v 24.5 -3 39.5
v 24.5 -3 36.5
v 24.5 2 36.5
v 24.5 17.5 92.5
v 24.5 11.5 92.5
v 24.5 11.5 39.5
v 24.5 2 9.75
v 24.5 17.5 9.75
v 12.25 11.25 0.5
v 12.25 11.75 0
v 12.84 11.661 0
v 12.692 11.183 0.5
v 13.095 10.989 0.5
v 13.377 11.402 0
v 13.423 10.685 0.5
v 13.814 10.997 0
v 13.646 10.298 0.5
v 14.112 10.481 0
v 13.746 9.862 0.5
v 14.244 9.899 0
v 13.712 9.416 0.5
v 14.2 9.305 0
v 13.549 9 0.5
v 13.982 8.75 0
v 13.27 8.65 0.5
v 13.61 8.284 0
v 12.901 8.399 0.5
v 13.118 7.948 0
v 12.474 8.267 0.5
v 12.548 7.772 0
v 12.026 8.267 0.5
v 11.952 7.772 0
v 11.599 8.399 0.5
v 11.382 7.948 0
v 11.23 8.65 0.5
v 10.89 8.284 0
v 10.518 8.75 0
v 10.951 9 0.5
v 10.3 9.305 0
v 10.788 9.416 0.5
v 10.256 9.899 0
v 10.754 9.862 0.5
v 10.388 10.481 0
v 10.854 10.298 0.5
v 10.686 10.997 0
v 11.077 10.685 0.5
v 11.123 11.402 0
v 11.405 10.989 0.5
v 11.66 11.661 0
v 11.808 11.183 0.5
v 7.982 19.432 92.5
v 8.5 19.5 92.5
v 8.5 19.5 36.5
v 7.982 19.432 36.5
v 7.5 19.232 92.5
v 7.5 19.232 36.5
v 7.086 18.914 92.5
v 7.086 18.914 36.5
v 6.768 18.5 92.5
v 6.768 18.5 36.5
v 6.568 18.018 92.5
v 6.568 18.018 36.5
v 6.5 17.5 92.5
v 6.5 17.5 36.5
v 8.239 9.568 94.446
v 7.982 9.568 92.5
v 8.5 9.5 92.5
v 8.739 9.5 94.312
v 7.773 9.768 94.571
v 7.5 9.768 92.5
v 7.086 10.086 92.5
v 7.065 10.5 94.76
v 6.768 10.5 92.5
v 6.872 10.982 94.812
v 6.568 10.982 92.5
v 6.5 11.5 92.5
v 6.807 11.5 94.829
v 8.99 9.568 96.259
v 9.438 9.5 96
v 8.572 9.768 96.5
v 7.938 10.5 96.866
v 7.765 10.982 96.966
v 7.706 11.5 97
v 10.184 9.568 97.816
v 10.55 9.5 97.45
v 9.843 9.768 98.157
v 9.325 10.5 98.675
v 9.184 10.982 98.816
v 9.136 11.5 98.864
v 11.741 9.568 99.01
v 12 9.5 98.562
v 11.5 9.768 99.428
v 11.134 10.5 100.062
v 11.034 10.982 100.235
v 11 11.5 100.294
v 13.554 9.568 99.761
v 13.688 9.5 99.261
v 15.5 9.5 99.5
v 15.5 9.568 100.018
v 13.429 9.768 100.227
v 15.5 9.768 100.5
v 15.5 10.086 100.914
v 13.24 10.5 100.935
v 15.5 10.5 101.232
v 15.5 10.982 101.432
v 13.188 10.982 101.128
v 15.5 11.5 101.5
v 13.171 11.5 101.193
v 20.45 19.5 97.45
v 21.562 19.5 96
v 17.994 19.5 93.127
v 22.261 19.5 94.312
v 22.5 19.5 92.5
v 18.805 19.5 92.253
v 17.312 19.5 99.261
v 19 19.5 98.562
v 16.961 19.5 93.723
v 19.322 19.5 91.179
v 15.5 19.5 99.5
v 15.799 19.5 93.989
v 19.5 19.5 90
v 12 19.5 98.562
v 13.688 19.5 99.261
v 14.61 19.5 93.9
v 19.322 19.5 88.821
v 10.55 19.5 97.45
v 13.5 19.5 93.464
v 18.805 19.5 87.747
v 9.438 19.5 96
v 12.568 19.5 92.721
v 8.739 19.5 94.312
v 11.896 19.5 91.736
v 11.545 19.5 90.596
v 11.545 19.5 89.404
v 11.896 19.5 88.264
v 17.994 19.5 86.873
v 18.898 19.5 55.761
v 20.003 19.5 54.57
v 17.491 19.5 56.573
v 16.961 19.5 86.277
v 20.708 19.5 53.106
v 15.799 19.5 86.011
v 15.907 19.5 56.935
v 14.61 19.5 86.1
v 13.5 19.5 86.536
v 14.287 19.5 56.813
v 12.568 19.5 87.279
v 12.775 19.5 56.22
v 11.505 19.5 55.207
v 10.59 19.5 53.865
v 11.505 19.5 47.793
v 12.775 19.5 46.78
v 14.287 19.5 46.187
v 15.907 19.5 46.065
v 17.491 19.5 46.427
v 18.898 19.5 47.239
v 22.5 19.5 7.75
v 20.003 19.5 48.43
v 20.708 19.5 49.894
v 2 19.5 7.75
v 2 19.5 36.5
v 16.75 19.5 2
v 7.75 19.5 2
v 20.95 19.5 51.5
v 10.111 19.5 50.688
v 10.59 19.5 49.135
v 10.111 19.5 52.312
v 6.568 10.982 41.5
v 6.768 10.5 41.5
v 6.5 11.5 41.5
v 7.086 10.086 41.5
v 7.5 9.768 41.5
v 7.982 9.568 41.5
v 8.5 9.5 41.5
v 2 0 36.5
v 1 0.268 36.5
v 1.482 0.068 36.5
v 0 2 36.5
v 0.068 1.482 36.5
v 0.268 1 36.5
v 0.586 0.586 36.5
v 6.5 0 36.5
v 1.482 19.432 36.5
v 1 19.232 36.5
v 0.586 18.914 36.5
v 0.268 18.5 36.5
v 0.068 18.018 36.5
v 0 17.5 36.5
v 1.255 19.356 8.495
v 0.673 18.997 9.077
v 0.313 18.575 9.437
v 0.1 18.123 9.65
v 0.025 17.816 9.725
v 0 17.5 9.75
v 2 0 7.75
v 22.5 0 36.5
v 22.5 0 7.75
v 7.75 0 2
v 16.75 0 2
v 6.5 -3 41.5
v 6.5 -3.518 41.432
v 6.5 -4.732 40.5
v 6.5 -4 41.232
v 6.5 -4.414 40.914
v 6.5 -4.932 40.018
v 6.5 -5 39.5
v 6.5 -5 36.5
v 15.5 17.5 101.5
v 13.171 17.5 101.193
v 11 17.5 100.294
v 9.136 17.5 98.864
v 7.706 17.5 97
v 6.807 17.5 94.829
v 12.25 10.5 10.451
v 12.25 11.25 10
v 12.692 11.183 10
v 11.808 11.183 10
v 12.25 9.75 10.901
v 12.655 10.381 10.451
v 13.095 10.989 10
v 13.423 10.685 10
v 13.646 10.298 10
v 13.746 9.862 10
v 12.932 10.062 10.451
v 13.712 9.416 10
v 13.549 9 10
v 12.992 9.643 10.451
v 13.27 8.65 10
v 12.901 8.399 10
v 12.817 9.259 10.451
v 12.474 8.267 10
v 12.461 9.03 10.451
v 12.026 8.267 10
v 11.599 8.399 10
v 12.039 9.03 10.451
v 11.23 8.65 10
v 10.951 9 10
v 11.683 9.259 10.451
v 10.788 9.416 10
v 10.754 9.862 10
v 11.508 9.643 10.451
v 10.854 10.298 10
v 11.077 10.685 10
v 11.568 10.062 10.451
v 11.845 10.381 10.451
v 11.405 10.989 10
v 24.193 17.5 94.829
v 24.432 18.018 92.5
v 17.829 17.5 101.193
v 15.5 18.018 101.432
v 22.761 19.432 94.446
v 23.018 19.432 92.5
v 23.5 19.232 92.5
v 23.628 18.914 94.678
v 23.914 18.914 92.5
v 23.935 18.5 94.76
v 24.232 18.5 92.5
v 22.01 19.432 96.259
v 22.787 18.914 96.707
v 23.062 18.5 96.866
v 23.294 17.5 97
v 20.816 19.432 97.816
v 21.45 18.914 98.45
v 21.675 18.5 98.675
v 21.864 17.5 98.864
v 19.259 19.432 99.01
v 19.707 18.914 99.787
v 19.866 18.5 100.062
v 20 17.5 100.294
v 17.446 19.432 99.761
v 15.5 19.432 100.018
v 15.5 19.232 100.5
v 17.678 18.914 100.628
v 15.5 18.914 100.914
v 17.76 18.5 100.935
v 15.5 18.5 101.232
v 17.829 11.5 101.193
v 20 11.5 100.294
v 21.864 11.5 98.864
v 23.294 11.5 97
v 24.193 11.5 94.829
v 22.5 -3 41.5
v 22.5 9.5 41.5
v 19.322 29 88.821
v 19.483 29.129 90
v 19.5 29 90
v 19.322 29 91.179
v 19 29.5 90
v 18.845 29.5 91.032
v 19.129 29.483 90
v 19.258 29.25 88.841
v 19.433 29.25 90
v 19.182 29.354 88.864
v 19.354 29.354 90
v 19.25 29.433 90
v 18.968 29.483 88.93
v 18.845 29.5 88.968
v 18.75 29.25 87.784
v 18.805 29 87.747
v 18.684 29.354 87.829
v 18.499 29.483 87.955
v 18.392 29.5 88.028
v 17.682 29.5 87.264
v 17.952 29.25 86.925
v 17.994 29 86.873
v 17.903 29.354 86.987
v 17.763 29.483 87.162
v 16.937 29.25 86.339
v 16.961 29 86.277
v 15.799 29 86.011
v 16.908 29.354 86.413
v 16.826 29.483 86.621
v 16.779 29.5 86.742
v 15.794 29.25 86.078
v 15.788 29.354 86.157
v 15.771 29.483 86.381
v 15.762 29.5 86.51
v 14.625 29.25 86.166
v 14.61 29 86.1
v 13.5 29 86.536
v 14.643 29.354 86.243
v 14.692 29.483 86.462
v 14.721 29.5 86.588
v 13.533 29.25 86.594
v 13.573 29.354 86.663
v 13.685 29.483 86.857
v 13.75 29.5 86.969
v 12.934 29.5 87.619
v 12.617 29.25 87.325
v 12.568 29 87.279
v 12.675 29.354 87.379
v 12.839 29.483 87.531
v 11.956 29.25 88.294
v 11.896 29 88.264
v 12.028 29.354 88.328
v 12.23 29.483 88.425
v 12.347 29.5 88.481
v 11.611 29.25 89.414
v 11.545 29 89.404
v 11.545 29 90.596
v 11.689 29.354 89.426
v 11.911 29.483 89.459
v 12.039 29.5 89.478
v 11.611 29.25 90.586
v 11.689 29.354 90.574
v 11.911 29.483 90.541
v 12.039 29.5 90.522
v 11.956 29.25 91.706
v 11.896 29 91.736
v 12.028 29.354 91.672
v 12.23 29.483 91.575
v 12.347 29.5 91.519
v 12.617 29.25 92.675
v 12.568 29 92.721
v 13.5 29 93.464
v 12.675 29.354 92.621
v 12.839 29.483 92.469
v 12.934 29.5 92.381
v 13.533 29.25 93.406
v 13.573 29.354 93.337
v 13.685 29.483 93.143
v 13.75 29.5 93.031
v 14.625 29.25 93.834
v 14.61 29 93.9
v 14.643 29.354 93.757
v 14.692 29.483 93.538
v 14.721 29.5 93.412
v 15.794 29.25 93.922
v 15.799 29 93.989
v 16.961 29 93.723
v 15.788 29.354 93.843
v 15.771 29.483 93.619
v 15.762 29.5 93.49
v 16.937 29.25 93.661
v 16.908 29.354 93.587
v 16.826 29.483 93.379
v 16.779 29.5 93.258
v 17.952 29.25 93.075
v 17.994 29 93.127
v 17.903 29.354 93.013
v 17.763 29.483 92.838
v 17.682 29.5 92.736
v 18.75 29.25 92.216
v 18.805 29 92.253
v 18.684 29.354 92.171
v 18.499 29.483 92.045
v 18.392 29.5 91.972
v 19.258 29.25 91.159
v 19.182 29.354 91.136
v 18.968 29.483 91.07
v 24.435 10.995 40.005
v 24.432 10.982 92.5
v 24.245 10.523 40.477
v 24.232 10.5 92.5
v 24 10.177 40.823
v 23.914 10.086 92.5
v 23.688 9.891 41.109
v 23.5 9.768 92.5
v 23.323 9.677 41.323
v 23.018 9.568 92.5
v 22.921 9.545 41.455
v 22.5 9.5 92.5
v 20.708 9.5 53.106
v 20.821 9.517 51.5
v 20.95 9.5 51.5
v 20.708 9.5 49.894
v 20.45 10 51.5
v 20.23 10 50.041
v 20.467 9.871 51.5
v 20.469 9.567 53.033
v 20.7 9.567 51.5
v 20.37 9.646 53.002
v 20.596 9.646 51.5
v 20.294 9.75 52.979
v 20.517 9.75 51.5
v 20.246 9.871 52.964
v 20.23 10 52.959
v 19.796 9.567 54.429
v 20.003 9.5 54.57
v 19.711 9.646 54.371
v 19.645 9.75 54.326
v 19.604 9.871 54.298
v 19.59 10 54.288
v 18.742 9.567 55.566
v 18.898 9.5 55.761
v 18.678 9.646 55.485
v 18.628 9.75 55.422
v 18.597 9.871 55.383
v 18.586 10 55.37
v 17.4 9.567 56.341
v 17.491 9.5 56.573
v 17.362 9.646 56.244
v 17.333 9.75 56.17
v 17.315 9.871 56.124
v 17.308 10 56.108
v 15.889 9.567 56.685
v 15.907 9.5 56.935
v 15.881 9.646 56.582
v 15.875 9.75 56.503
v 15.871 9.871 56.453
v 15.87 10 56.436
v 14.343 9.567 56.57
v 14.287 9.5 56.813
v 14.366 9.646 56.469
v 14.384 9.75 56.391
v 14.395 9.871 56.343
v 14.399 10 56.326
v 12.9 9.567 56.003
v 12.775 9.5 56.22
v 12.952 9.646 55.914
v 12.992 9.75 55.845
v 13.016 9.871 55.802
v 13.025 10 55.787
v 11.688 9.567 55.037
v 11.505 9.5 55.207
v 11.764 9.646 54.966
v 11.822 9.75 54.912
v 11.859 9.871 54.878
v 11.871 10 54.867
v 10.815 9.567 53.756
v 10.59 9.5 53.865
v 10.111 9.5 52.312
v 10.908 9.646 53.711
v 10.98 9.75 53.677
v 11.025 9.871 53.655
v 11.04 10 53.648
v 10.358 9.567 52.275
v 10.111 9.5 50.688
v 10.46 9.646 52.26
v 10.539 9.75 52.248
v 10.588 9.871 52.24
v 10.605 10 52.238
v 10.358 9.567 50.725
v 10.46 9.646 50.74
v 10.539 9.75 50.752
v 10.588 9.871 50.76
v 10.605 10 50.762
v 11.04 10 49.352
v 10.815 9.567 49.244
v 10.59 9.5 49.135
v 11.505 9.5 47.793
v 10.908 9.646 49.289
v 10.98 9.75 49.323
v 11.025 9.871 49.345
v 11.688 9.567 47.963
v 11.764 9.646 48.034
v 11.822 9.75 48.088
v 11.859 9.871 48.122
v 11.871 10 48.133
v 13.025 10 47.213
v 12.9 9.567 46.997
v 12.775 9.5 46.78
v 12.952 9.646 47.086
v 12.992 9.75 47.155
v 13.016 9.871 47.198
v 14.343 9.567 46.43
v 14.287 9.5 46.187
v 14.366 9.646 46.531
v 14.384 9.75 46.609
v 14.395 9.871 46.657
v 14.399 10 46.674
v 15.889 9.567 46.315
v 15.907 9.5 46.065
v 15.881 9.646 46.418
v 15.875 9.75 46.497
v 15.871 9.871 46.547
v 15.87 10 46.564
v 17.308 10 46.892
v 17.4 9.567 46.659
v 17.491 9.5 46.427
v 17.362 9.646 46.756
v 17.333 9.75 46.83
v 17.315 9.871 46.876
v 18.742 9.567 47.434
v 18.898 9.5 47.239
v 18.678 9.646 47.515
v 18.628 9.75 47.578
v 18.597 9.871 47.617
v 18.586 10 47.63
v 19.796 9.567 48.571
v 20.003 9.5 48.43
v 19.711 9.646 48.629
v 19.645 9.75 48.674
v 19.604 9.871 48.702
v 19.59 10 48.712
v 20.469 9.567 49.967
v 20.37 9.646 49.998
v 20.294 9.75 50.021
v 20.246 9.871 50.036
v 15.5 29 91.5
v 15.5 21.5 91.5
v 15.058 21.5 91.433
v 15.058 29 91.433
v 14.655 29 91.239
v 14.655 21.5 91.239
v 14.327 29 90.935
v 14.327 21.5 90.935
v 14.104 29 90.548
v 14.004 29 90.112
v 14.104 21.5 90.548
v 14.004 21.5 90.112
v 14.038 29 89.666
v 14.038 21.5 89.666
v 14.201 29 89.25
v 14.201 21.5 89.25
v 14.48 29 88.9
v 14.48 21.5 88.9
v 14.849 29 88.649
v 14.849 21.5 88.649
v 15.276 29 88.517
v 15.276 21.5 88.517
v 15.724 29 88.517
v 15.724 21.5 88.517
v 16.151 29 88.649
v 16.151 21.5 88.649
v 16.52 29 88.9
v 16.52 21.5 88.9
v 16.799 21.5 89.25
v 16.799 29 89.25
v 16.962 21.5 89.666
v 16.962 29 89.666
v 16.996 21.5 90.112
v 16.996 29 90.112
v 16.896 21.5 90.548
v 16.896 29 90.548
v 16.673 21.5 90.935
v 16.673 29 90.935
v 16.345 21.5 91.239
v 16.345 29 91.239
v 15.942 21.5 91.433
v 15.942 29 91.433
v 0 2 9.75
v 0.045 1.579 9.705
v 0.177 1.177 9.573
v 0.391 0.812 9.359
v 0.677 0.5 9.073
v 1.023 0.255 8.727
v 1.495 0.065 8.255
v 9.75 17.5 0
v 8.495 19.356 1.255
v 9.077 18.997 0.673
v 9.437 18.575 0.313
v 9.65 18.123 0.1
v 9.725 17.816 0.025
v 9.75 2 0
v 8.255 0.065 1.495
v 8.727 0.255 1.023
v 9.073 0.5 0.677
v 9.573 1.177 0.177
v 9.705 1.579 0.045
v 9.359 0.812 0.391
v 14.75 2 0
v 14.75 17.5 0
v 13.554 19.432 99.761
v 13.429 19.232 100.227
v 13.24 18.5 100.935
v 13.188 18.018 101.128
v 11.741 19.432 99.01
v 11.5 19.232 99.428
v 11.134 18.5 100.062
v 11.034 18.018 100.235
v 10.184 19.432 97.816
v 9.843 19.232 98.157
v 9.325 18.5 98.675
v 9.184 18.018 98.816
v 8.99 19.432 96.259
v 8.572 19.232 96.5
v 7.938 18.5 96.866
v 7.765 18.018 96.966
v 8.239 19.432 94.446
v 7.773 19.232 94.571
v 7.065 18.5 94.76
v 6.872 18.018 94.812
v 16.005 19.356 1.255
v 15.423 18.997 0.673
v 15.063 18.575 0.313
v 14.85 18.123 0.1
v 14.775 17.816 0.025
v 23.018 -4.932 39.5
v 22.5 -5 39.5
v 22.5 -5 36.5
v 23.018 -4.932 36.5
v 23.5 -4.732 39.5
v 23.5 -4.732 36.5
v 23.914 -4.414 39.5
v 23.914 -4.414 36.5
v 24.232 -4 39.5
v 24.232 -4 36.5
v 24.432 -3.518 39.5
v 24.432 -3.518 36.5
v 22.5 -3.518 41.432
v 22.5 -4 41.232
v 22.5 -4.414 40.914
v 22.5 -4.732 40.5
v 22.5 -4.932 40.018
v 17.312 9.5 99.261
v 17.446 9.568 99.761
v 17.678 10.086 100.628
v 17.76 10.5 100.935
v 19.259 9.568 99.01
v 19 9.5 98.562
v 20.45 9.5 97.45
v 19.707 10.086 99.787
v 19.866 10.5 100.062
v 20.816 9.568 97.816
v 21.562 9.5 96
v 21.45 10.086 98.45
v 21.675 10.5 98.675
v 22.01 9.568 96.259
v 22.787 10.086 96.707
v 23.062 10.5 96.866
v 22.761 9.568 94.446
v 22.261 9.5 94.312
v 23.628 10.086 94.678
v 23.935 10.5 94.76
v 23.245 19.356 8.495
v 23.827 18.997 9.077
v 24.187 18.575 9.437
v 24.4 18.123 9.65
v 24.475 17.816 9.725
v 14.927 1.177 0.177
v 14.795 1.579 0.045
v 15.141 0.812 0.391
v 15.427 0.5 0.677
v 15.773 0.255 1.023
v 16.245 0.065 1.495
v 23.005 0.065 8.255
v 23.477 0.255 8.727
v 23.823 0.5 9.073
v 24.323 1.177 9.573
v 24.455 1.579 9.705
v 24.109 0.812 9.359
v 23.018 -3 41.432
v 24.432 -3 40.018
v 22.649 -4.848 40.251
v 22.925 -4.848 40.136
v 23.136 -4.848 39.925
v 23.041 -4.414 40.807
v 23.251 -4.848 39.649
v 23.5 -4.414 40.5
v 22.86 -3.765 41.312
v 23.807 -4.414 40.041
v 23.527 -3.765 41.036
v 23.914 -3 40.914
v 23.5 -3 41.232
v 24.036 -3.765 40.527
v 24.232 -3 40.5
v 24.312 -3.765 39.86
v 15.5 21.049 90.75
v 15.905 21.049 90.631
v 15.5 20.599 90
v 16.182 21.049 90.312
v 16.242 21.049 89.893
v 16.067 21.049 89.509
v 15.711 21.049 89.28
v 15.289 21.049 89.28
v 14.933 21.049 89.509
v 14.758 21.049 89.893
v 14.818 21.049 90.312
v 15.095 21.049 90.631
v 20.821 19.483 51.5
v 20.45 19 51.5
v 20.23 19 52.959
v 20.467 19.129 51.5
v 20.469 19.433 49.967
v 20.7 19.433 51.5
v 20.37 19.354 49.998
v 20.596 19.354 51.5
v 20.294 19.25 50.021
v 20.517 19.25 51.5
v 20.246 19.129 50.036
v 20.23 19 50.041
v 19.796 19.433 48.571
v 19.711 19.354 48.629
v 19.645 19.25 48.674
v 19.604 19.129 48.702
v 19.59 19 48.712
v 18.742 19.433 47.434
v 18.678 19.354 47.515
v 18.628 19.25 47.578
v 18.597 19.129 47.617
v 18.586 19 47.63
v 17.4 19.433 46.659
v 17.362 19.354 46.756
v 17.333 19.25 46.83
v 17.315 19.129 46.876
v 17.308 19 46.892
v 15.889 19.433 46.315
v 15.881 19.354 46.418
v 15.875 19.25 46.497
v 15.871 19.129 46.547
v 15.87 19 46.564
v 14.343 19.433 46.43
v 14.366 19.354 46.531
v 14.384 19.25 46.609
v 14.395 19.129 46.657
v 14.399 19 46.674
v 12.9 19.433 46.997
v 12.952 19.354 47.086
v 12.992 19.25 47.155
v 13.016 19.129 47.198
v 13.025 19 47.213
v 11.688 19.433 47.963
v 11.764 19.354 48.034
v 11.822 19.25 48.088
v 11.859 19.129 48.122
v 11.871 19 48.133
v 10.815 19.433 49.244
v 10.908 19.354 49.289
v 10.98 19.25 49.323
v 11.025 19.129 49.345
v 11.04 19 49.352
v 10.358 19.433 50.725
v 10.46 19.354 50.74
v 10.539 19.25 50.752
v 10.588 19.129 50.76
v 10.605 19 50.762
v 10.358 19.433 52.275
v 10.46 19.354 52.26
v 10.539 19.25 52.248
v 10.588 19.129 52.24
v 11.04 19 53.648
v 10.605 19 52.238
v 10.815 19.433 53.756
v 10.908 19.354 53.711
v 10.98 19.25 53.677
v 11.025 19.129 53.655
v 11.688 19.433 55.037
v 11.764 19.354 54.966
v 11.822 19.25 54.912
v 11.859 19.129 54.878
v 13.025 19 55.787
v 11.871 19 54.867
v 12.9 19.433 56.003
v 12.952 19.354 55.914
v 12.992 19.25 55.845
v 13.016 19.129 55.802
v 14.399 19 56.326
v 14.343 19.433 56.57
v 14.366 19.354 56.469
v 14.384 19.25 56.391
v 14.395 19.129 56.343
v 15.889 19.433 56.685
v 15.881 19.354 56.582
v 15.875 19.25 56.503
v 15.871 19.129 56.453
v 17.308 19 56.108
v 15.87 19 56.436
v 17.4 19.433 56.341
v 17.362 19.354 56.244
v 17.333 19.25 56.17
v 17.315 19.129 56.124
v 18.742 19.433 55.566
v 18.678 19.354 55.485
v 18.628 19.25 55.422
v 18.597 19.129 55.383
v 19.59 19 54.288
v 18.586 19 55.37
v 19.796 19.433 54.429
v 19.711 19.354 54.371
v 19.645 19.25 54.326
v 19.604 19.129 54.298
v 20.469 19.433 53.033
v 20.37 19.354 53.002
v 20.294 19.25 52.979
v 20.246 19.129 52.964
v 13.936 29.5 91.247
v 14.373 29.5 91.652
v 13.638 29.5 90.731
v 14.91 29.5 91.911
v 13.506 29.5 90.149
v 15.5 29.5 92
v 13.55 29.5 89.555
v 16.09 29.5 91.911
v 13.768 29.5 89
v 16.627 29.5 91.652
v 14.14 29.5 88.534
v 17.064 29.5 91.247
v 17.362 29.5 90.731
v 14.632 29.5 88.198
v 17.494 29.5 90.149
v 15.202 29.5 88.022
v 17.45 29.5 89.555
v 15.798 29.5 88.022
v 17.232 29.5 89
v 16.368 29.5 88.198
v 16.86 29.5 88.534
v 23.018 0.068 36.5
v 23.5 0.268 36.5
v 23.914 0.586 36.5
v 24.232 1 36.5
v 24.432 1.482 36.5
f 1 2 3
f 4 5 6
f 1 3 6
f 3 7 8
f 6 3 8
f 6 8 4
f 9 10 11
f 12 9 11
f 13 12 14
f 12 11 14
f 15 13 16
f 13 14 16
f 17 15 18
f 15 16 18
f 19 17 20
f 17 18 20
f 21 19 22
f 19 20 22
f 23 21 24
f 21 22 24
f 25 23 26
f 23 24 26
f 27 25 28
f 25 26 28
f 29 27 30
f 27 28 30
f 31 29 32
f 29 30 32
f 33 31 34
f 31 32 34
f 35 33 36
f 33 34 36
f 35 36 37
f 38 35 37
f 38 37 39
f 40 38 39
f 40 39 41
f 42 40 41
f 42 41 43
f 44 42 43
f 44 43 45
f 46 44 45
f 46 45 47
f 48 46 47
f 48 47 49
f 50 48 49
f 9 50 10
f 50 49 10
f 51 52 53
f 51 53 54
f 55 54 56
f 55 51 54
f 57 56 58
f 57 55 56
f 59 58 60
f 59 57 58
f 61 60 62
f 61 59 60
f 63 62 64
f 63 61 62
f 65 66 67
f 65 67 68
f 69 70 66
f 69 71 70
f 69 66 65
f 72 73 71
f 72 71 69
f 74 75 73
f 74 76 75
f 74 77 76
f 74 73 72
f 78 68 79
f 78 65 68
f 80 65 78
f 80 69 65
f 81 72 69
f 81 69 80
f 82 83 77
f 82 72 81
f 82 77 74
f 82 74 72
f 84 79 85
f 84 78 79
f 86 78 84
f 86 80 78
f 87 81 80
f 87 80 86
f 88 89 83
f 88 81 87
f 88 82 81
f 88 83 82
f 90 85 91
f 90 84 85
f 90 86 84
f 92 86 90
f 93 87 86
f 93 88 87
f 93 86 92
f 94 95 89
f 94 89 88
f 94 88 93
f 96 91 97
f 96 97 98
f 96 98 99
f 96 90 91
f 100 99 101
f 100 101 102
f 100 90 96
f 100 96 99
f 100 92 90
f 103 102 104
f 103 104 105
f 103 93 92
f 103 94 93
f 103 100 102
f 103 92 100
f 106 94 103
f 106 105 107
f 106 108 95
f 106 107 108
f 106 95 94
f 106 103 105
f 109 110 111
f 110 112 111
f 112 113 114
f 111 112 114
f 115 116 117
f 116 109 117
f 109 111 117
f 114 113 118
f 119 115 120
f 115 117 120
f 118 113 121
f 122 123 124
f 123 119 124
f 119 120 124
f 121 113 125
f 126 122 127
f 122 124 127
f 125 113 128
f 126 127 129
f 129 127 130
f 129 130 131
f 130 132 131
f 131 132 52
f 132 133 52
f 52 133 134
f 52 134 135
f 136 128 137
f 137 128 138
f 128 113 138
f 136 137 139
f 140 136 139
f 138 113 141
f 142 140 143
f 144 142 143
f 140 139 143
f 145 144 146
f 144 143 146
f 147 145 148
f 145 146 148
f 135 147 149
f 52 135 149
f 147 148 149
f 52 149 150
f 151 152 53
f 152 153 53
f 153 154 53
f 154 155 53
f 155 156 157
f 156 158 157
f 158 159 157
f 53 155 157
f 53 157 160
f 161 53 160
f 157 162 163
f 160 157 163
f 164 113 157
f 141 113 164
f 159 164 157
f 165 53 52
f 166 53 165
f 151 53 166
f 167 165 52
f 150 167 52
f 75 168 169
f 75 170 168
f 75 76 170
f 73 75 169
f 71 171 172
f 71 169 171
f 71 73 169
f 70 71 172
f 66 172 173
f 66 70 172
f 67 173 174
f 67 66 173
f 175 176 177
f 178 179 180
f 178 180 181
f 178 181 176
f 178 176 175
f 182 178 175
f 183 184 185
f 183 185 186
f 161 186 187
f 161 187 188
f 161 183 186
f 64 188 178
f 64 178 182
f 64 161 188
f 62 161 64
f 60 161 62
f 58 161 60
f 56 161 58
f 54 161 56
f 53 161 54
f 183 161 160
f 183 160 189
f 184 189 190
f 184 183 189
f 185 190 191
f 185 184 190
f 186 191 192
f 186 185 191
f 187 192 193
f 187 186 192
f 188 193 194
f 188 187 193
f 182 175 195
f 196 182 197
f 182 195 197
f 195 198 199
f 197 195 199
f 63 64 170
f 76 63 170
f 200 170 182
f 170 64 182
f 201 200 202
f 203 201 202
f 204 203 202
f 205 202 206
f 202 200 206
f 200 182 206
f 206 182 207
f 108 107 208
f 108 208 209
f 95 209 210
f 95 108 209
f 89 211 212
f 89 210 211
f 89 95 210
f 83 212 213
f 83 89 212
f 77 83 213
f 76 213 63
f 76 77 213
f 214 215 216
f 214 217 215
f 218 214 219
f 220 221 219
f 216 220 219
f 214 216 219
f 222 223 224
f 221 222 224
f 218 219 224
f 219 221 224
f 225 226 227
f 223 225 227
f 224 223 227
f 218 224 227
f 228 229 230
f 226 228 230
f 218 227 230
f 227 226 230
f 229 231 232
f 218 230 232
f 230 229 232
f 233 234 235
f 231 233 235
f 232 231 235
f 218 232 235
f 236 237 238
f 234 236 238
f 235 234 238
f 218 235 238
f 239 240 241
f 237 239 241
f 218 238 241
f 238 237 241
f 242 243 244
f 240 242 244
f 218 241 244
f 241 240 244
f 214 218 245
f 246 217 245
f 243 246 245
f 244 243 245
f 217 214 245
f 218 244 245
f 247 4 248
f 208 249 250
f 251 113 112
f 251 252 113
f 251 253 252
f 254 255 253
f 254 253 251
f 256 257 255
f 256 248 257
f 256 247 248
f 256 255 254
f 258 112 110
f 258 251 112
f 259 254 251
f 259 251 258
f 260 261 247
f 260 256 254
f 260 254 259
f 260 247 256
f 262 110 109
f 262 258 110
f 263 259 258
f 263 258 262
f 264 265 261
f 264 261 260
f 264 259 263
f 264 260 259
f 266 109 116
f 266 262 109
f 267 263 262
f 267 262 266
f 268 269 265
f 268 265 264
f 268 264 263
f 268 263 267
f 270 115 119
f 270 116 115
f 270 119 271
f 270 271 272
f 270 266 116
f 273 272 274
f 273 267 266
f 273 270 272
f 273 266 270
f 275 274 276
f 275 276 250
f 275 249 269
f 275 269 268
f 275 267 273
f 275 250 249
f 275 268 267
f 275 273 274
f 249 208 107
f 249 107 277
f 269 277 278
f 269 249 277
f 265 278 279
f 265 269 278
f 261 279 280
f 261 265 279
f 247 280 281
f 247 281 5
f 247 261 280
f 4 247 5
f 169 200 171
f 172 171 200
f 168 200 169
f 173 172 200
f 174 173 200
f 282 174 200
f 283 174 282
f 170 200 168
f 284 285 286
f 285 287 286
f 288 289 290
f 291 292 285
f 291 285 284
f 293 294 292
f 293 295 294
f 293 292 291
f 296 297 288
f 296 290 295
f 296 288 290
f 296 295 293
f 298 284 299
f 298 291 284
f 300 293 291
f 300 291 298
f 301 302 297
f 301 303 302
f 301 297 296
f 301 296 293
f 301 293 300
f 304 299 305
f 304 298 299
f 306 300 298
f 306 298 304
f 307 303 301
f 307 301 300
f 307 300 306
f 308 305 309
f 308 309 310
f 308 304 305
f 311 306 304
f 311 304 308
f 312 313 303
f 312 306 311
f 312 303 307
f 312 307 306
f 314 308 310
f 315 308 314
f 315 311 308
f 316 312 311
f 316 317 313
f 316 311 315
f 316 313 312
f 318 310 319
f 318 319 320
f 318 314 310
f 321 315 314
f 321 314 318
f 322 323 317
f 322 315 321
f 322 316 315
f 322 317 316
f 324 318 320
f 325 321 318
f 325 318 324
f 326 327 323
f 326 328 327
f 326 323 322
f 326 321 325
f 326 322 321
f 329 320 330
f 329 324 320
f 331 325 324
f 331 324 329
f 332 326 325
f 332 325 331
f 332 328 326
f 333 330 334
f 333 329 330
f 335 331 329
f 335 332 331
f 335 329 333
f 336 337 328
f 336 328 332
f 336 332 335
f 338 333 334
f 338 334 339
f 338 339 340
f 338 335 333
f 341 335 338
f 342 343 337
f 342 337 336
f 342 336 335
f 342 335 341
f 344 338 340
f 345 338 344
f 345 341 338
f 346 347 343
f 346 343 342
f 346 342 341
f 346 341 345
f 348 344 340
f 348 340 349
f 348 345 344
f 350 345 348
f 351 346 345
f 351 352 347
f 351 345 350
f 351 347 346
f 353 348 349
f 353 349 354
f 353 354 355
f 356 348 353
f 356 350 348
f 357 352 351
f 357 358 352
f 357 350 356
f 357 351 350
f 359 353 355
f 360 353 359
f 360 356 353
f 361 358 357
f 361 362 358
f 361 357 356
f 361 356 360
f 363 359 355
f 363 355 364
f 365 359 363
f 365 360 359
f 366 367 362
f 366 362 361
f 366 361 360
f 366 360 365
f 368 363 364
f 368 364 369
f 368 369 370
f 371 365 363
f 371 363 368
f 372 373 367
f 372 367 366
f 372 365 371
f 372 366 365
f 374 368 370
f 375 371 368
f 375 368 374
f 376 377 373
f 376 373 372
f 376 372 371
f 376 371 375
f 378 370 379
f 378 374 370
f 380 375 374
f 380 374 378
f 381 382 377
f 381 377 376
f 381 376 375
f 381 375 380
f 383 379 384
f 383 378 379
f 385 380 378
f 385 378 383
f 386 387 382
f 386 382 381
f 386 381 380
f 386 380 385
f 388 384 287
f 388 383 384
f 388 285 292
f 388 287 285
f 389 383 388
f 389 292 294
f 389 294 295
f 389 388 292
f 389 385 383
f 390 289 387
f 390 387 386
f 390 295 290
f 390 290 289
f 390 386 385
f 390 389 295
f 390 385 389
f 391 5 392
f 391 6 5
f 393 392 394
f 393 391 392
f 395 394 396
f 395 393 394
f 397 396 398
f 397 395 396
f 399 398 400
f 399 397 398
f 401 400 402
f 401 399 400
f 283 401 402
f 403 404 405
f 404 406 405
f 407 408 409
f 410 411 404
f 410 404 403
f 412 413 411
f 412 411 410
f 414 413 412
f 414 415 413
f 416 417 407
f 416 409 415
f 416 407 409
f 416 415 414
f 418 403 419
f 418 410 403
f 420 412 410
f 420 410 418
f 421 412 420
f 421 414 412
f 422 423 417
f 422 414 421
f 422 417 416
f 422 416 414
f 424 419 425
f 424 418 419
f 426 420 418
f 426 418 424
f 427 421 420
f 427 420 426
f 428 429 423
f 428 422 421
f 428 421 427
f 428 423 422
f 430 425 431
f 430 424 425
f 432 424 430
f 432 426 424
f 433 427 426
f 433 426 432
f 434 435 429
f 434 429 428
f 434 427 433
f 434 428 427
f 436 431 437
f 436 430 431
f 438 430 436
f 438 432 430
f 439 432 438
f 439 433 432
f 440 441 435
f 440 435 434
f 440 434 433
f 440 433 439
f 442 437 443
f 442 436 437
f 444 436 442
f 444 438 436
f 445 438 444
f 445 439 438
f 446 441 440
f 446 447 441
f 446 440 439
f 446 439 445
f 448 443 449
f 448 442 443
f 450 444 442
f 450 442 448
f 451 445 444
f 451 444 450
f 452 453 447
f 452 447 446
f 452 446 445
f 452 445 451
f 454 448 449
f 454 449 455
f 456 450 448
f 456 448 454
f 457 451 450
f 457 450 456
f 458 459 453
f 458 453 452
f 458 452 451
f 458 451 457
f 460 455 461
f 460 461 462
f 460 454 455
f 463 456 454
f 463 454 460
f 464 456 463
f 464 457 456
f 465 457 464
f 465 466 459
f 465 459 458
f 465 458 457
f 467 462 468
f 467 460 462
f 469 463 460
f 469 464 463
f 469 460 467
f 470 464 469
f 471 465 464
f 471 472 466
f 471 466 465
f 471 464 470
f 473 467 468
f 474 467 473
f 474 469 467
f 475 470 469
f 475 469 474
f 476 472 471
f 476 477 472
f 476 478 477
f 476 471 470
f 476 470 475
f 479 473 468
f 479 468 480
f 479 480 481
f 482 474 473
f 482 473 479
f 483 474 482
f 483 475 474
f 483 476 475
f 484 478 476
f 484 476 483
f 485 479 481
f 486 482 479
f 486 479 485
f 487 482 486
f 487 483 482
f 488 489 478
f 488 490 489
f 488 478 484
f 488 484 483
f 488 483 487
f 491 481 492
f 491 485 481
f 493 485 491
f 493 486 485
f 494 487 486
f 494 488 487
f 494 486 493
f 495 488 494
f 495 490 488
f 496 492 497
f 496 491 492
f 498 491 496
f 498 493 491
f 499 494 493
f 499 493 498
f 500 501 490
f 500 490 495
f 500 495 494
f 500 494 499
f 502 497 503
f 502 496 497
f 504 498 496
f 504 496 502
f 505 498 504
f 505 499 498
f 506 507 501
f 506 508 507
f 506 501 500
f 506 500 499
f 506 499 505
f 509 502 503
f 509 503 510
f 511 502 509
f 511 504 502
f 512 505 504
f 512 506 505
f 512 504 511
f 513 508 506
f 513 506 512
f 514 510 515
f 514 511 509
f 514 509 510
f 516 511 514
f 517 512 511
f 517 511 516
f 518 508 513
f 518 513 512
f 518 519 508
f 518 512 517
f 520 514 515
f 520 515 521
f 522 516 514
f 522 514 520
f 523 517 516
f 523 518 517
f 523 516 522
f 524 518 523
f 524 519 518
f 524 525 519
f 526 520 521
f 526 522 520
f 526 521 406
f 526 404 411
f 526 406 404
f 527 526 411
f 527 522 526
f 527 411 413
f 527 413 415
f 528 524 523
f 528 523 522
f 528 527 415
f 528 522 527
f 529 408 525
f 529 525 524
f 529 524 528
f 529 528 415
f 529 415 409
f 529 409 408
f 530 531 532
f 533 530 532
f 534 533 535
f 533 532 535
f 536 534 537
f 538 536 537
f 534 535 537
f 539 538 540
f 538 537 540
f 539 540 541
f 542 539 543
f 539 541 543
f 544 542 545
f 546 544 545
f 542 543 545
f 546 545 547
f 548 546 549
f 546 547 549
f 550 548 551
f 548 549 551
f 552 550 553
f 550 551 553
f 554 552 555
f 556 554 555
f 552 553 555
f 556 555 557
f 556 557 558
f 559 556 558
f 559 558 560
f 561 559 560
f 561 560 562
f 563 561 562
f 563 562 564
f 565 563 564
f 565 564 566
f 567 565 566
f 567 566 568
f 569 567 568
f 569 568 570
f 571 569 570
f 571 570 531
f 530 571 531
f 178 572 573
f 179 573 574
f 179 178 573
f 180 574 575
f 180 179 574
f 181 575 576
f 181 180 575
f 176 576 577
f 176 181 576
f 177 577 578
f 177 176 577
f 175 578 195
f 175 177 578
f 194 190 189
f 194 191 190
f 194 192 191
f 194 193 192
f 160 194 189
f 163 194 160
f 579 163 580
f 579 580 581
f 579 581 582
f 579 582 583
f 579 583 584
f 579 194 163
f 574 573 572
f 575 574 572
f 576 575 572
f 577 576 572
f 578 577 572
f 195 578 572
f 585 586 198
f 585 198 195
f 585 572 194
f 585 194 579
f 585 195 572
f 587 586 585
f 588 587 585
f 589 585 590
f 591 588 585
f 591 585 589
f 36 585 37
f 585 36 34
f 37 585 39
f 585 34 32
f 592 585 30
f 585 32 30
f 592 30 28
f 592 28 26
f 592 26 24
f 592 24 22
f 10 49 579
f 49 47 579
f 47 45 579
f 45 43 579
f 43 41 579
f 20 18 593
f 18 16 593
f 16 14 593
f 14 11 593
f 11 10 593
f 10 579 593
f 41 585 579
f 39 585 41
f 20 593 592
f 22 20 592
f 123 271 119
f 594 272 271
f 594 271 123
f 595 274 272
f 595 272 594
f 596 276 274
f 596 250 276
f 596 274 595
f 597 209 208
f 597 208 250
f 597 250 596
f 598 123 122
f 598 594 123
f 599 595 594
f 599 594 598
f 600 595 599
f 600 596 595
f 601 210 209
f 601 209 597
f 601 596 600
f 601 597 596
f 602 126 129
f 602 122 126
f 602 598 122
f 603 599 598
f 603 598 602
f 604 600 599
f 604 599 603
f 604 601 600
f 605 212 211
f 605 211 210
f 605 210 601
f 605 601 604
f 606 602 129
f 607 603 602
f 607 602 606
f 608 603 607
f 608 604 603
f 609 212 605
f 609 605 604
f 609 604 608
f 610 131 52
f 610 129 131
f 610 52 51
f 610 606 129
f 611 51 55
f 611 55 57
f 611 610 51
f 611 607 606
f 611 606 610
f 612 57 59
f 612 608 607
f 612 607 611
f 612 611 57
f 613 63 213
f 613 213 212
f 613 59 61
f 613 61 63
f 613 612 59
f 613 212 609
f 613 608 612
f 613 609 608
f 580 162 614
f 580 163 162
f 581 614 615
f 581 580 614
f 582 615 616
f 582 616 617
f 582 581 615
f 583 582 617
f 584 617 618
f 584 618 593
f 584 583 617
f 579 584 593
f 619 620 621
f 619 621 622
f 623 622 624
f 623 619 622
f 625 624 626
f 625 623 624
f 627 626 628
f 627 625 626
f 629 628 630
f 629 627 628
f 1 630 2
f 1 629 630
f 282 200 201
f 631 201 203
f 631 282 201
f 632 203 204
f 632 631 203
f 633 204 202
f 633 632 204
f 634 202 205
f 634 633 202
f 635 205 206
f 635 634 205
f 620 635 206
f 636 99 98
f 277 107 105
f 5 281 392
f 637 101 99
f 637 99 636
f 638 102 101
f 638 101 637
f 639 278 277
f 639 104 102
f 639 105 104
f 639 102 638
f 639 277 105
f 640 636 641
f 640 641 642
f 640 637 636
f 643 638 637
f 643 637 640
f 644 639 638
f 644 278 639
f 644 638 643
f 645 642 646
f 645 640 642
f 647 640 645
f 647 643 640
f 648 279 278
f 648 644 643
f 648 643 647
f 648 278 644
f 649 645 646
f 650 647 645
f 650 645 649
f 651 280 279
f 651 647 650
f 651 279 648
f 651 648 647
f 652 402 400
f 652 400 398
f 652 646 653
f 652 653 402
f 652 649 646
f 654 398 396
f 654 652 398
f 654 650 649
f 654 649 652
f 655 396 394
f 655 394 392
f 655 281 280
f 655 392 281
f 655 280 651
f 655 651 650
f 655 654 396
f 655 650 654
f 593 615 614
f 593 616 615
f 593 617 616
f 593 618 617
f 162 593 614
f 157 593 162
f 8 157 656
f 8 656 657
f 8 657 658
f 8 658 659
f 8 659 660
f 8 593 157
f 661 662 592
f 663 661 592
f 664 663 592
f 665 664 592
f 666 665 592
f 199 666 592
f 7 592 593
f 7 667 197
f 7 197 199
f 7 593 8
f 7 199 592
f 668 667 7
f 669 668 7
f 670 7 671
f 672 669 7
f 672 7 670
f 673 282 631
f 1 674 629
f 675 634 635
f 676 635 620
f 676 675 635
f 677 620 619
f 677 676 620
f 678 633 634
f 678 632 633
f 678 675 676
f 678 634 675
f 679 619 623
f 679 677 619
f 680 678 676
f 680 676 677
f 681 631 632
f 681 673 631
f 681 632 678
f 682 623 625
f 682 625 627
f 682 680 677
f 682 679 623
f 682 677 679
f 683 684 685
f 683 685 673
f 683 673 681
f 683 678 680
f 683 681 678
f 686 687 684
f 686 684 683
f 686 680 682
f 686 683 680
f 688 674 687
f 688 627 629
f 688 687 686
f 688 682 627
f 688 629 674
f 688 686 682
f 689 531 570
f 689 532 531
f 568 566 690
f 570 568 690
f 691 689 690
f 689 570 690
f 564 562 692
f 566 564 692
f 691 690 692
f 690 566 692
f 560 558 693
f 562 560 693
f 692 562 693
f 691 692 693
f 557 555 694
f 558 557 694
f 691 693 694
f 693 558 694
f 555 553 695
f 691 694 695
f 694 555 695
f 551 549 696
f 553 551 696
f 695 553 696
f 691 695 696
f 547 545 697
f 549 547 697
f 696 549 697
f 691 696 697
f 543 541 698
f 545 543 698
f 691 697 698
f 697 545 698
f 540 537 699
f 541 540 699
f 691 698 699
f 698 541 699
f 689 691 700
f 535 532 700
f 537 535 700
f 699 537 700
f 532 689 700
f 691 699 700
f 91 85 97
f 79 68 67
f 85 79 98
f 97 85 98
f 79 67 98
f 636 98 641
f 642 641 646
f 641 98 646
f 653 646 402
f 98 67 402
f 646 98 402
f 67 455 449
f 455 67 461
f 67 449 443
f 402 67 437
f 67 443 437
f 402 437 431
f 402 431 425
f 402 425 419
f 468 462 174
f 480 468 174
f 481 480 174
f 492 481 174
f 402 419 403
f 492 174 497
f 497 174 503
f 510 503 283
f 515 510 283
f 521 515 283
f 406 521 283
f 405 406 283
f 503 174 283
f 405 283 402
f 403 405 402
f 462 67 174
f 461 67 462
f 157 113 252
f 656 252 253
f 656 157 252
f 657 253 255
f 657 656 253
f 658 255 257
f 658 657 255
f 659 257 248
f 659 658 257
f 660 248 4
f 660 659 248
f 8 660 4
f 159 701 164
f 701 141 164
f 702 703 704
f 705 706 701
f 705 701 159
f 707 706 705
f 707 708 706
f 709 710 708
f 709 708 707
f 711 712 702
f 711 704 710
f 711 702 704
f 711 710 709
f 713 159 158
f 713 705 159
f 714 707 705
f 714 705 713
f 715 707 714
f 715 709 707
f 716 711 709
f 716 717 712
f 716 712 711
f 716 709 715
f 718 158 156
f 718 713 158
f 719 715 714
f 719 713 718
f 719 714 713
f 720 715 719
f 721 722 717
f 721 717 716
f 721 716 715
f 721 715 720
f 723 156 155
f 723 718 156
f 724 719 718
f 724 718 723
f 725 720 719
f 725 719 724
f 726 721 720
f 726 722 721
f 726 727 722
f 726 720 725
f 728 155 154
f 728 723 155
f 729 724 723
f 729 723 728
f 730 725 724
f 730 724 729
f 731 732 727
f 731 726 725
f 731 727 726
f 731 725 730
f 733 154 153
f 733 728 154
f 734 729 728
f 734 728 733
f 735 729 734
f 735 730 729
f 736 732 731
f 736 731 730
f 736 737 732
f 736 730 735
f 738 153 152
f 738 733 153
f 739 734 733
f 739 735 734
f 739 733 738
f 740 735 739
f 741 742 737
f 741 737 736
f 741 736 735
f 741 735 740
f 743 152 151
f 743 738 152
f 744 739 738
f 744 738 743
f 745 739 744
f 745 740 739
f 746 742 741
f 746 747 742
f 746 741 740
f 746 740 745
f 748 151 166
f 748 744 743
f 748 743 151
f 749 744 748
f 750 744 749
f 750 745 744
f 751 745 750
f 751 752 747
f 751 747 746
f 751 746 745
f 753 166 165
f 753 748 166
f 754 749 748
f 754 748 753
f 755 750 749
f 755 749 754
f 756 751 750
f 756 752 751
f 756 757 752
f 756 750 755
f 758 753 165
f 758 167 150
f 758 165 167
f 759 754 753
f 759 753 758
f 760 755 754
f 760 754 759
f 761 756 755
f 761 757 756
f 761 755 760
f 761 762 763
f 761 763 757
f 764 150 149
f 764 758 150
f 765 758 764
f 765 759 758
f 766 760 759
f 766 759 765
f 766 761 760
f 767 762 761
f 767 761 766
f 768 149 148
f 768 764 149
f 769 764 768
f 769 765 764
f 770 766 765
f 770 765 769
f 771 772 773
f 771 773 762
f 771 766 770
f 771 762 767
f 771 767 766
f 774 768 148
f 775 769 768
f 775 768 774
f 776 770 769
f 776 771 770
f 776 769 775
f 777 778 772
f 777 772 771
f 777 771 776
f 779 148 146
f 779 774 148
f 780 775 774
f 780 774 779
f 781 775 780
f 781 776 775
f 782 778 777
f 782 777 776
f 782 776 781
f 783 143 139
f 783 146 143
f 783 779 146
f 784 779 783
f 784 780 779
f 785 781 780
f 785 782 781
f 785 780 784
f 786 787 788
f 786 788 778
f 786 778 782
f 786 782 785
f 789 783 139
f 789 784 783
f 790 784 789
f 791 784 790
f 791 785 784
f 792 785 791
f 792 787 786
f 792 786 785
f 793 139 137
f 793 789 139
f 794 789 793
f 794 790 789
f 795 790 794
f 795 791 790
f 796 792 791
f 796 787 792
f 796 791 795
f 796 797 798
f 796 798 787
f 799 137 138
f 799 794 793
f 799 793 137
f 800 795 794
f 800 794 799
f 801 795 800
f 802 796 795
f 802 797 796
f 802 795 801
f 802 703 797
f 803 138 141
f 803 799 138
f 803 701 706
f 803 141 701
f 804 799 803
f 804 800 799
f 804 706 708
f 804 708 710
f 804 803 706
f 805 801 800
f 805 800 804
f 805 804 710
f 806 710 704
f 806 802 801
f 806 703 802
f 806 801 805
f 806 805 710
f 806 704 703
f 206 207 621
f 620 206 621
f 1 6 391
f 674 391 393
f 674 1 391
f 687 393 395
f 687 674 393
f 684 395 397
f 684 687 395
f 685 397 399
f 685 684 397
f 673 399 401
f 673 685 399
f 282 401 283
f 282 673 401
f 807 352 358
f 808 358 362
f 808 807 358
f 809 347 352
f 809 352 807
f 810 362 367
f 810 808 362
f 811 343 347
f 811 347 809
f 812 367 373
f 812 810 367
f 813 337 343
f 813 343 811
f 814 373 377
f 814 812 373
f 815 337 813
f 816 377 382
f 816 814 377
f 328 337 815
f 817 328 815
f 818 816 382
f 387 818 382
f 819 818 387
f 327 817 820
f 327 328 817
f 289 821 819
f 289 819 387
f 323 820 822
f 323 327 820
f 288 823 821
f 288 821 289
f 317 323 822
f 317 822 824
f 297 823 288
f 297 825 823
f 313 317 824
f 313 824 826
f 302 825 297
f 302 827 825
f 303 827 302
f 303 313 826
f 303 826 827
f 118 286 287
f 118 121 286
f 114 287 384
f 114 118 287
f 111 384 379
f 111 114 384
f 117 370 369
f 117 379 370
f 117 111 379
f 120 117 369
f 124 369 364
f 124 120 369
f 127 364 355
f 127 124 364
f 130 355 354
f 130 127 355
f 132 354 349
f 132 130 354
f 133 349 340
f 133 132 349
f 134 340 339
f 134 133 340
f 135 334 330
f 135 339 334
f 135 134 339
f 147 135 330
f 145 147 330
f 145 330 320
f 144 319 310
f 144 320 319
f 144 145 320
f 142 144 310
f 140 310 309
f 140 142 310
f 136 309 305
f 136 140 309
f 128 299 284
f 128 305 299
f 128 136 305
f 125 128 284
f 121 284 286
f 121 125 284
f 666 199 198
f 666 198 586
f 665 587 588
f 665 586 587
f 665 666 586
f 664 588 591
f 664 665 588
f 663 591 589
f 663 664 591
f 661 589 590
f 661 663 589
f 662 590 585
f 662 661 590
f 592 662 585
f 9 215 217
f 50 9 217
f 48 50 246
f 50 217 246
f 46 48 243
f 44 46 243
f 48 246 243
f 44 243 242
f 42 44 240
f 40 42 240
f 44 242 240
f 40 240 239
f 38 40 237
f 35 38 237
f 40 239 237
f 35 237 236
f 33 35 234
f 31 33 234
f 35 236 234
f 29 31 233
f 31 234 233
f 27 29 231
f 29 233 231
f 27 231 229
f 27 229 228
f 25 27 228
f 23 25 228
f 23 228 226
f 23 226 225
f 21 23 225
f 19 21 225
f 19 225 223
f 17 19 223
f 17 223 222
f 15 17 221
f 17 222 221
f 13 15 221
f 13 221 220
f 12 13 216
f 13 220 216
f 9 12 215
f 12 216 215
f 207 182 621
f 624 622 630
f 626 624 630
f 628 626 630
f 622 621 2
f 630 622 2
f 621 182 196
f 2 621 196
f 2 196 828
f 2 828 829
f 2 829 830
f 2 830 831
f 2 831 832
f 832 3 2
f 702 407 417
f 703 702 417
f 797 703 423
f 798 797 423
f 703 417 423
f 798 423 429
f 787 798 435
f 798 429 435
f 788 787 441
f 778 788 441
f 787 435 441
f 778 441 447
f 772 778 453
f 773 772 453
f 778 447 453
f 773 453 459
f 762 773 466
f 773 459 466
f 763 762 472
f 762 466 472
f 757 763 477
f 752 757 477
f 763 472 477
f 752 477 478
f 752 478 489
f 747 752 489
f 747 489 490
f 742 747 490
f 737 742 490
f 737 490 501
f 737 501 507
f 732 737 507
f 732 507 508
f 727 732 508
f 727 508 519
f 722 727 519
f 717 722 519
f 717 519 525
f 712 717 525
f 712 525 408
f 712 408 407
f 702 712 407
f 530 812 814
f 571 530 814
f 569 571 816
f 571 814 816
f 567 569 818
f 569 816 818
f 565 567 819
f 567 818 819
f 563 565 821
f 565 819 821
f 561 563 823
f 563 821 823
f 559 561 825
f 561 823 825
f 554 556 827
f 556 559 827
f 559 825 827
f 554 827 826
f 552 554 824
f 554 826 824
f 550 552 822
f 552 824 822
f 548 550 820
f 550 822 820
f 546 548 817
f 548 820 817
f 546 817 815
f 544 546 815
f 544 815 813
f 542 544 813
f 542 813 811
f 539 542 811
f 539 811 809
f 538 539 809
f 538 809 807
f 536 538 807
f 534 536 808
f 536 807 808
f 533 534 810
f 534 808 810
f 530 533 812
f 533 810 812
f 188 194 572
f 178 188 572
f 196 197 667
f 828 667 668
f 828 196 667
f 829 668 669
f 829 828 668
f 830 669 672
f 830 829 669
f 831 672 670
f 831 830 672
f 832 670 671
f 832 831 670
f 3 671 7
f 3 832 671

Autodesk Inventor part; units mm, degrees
ref_plane "YZ Plane" through (0, 0, 0) normal (1, 0, 0) x (0, 1, 0)
ref_plane "XZ Plane" through (0, 0, 0) normal (0, 1, 0) x (-1, 0, 0)
ref_plane "XY Plane" through (0, 0, 0) normal (0, 0, 1) x (1, 0, 0)
sketch "Sketch1" plane through (0, 0, 0) normal (0, 0, 1) x (1, 0, 0)
  line L0 (0, 0) -> (24.5, 0)
  line L1 (24.5, 0) -> (24.5, 19.5)
  line L2 (24.5, 19.5) -> (0, 19.5)
  line L3 (0, 19.5) -> (0, 0)
  dimension "d0" = 19.5
  dimension "d1" = 24.5
extrude "Extrusion1" add sketch "Sketch1" along normal blind 36.5
sketch "Sketch12" plane through (0, 0, 0) normal (0, -1, 0) x (1, 0, 0)
  line L0 (24.5, 0) -> (24.5, 36.5) projected
  line L1 (0, 0) -> (0, 36.5) projected
  line L2 (24.5, 0) -> (24.5, 36.5) projected
  line L3 (24.5, 9.75) -> (24.5, 0)
  line L4 (0, 0) -> (24.5, 0) projected
  line L5 (14.75, 0) -> (24.5, 9.75)
  line L6 (0, 0) -> (0, 36.5) projected
  line L7 (0, 9.75) -> (9.75, 0)
  line L8 (9.75, 0) -> (0, 0)
  line L9 (0, 0) -> (0, 9.75)
  dimension "d75" = 5
  dimension "d76" = 45
  dimension "d77" = 45
  dimension "d79" = 9.75
extrude "Extrusion10" cut sketch "Sketch12" against normal through all
sketch "Sketch2" plane through (0, 0, 36.5) normal (0, 0, 1) x (1, 0, 0)
  line L0 (6.5, 9.5) -> (24.5, 9.5)
  line L1 (24.5, 9.5) -> (24.5, 19.5)
  line L2 (24.5, 19.5) -> (6.5, 19.5)
  line L3 (6.5, 19.5) -> (6.5, 9.5)
  line L4 (0, 0) -> (24.5, 0) projected
  line L5 (24.5, 0) -> (24.5, 19.5) projected
  line L6 (24.5, 19.5) -> (0, 19.5) projected
  dimension "d4" = 10
  dimension "d6" = 18
extrude "Extrusion2" add sketch "Sketch2" along normal blind 65
sketch "Sketch3" plane through (6.5, 9.5, 36.5) normal (0, -1, 0) x (1, 0, 0)
  circle A0 centre (9, 15) radius 4.95
  line L0 (18, 0) -> (18, 65) projected
  line L1 (18, 0) -> (0, 0) projected
  line L2 (0, 65) -> (18, 65) projected
  point P0 (-6.5, -36.5)
  point P1 (9, 65)
  dimension "d9" = 9.9
  dimension "d11" = 15
extrude "Extrusion3" cut sketch "Sketch3" against normal up to next
sketch "Sketch9" plane through (6.5, 19.5, 35) normal (0, 1, 0) x (1, 0, 0)
  circle A0 centre (9, -55) radius 4
  line L0 (18, -66.5) -> (0, -66.5) projected
  line L1 (18, 0) -> (0, 0) projected
  point P0 (-6.5, 35)
  point P1 (9, -66.5)
  dimension "d42" = 8
  dimension "d43" = 55
extrude "Extrusion9" add sketch "Sketch9" along normal blind 10
sketch "Sketch14" plane through (0, 0, 36.5) normal (0, 0, 1) x (1, 0, 0)
  line L0 (24.5, 9.5) -> (6.5, 9.5) projected
  line L1 (24.5, 9.5) -> (6.5, 9.5)
  line L2 (6.5, 9.5) -> (6.5, -5)
  line L3 (6.5, -5) -> (24.5, -5)
  line L4 (24.5, -5) -> (24.5, 9.5)
  line L5 (6.5, 9.5) -> (6.5, 19.5) projected
  line L6 (0, 0) -> (24.5, 0) projected
  dimension "d89" = 5
extrude "Extrusion11" add sketch "Sketch14" along normal blind 5
fillet "Fillet3" radius 9 2 edges at (24.5, 14.5, 101.5) (6.5, 14.5, 101.5)
fillet "Fillet1" radius 2 15 edges at (12.25, 0, 0) (24.5, 0, 23.125) (0, 0, 23.125) (0, 19.5, 23.125) (12.25, 19.5, 0) (21.864, 19.5, 98.864) (9.136, 19.5, 98.864) (6.5, 19.5, 64.5001) (21.864, 9.5, 98.864) (15.5, 9.5, 101.5) (24.5, 9.5, 67.0001) (6.5, 9.5, 67.0001) (24.5, 2.25, 41.5) (24.5, -5, 39) (15.5, -5, 41.5)
fillet "Fillet5" radius 0.5 2 edges at (10.55, 9.5, 51.5) (10.55, 19.5, 51.5)
fillet "Fillet6" radius 0.5 1 edges at (11.5, 29.5, 90)
sketch "Sketch10" plane through (15.5, 29.5, 90) normal (0, 1, 0) x (1, 0, 0)
  point P0 (-15.5, 90)
  point P1 (0, 0)
hole "Upper Arm Cap Hole" at (15.5, 29.5, 90) direction (0, -1, 0) diameter 3 depth 8 tip angle 118 countersink diameter 4 countersink angle 90
sketch "Sketch13" plane through (0, 0, 0) normal (0, 0, -1) x (-1, 0, 0)
  line L0 (-14.75, 17.5) -> (-14.75, 2) projected
  line L1 (-9.75, 2) -> (-14.75, 2) projected
  point P0 (0, 0)
  point P1 (-12.25, 9.75)
  point P2 (-14.75, 9.75)
  point P3 (-12.25, 2)
hole "Hole3" at (12.25, 9.75, 0) direction (0, 0, 1) diameter 3 depth 10 tip angle 118 countersink diameter 4 countersink angle 90
properties part number "Lift Mount Right"
